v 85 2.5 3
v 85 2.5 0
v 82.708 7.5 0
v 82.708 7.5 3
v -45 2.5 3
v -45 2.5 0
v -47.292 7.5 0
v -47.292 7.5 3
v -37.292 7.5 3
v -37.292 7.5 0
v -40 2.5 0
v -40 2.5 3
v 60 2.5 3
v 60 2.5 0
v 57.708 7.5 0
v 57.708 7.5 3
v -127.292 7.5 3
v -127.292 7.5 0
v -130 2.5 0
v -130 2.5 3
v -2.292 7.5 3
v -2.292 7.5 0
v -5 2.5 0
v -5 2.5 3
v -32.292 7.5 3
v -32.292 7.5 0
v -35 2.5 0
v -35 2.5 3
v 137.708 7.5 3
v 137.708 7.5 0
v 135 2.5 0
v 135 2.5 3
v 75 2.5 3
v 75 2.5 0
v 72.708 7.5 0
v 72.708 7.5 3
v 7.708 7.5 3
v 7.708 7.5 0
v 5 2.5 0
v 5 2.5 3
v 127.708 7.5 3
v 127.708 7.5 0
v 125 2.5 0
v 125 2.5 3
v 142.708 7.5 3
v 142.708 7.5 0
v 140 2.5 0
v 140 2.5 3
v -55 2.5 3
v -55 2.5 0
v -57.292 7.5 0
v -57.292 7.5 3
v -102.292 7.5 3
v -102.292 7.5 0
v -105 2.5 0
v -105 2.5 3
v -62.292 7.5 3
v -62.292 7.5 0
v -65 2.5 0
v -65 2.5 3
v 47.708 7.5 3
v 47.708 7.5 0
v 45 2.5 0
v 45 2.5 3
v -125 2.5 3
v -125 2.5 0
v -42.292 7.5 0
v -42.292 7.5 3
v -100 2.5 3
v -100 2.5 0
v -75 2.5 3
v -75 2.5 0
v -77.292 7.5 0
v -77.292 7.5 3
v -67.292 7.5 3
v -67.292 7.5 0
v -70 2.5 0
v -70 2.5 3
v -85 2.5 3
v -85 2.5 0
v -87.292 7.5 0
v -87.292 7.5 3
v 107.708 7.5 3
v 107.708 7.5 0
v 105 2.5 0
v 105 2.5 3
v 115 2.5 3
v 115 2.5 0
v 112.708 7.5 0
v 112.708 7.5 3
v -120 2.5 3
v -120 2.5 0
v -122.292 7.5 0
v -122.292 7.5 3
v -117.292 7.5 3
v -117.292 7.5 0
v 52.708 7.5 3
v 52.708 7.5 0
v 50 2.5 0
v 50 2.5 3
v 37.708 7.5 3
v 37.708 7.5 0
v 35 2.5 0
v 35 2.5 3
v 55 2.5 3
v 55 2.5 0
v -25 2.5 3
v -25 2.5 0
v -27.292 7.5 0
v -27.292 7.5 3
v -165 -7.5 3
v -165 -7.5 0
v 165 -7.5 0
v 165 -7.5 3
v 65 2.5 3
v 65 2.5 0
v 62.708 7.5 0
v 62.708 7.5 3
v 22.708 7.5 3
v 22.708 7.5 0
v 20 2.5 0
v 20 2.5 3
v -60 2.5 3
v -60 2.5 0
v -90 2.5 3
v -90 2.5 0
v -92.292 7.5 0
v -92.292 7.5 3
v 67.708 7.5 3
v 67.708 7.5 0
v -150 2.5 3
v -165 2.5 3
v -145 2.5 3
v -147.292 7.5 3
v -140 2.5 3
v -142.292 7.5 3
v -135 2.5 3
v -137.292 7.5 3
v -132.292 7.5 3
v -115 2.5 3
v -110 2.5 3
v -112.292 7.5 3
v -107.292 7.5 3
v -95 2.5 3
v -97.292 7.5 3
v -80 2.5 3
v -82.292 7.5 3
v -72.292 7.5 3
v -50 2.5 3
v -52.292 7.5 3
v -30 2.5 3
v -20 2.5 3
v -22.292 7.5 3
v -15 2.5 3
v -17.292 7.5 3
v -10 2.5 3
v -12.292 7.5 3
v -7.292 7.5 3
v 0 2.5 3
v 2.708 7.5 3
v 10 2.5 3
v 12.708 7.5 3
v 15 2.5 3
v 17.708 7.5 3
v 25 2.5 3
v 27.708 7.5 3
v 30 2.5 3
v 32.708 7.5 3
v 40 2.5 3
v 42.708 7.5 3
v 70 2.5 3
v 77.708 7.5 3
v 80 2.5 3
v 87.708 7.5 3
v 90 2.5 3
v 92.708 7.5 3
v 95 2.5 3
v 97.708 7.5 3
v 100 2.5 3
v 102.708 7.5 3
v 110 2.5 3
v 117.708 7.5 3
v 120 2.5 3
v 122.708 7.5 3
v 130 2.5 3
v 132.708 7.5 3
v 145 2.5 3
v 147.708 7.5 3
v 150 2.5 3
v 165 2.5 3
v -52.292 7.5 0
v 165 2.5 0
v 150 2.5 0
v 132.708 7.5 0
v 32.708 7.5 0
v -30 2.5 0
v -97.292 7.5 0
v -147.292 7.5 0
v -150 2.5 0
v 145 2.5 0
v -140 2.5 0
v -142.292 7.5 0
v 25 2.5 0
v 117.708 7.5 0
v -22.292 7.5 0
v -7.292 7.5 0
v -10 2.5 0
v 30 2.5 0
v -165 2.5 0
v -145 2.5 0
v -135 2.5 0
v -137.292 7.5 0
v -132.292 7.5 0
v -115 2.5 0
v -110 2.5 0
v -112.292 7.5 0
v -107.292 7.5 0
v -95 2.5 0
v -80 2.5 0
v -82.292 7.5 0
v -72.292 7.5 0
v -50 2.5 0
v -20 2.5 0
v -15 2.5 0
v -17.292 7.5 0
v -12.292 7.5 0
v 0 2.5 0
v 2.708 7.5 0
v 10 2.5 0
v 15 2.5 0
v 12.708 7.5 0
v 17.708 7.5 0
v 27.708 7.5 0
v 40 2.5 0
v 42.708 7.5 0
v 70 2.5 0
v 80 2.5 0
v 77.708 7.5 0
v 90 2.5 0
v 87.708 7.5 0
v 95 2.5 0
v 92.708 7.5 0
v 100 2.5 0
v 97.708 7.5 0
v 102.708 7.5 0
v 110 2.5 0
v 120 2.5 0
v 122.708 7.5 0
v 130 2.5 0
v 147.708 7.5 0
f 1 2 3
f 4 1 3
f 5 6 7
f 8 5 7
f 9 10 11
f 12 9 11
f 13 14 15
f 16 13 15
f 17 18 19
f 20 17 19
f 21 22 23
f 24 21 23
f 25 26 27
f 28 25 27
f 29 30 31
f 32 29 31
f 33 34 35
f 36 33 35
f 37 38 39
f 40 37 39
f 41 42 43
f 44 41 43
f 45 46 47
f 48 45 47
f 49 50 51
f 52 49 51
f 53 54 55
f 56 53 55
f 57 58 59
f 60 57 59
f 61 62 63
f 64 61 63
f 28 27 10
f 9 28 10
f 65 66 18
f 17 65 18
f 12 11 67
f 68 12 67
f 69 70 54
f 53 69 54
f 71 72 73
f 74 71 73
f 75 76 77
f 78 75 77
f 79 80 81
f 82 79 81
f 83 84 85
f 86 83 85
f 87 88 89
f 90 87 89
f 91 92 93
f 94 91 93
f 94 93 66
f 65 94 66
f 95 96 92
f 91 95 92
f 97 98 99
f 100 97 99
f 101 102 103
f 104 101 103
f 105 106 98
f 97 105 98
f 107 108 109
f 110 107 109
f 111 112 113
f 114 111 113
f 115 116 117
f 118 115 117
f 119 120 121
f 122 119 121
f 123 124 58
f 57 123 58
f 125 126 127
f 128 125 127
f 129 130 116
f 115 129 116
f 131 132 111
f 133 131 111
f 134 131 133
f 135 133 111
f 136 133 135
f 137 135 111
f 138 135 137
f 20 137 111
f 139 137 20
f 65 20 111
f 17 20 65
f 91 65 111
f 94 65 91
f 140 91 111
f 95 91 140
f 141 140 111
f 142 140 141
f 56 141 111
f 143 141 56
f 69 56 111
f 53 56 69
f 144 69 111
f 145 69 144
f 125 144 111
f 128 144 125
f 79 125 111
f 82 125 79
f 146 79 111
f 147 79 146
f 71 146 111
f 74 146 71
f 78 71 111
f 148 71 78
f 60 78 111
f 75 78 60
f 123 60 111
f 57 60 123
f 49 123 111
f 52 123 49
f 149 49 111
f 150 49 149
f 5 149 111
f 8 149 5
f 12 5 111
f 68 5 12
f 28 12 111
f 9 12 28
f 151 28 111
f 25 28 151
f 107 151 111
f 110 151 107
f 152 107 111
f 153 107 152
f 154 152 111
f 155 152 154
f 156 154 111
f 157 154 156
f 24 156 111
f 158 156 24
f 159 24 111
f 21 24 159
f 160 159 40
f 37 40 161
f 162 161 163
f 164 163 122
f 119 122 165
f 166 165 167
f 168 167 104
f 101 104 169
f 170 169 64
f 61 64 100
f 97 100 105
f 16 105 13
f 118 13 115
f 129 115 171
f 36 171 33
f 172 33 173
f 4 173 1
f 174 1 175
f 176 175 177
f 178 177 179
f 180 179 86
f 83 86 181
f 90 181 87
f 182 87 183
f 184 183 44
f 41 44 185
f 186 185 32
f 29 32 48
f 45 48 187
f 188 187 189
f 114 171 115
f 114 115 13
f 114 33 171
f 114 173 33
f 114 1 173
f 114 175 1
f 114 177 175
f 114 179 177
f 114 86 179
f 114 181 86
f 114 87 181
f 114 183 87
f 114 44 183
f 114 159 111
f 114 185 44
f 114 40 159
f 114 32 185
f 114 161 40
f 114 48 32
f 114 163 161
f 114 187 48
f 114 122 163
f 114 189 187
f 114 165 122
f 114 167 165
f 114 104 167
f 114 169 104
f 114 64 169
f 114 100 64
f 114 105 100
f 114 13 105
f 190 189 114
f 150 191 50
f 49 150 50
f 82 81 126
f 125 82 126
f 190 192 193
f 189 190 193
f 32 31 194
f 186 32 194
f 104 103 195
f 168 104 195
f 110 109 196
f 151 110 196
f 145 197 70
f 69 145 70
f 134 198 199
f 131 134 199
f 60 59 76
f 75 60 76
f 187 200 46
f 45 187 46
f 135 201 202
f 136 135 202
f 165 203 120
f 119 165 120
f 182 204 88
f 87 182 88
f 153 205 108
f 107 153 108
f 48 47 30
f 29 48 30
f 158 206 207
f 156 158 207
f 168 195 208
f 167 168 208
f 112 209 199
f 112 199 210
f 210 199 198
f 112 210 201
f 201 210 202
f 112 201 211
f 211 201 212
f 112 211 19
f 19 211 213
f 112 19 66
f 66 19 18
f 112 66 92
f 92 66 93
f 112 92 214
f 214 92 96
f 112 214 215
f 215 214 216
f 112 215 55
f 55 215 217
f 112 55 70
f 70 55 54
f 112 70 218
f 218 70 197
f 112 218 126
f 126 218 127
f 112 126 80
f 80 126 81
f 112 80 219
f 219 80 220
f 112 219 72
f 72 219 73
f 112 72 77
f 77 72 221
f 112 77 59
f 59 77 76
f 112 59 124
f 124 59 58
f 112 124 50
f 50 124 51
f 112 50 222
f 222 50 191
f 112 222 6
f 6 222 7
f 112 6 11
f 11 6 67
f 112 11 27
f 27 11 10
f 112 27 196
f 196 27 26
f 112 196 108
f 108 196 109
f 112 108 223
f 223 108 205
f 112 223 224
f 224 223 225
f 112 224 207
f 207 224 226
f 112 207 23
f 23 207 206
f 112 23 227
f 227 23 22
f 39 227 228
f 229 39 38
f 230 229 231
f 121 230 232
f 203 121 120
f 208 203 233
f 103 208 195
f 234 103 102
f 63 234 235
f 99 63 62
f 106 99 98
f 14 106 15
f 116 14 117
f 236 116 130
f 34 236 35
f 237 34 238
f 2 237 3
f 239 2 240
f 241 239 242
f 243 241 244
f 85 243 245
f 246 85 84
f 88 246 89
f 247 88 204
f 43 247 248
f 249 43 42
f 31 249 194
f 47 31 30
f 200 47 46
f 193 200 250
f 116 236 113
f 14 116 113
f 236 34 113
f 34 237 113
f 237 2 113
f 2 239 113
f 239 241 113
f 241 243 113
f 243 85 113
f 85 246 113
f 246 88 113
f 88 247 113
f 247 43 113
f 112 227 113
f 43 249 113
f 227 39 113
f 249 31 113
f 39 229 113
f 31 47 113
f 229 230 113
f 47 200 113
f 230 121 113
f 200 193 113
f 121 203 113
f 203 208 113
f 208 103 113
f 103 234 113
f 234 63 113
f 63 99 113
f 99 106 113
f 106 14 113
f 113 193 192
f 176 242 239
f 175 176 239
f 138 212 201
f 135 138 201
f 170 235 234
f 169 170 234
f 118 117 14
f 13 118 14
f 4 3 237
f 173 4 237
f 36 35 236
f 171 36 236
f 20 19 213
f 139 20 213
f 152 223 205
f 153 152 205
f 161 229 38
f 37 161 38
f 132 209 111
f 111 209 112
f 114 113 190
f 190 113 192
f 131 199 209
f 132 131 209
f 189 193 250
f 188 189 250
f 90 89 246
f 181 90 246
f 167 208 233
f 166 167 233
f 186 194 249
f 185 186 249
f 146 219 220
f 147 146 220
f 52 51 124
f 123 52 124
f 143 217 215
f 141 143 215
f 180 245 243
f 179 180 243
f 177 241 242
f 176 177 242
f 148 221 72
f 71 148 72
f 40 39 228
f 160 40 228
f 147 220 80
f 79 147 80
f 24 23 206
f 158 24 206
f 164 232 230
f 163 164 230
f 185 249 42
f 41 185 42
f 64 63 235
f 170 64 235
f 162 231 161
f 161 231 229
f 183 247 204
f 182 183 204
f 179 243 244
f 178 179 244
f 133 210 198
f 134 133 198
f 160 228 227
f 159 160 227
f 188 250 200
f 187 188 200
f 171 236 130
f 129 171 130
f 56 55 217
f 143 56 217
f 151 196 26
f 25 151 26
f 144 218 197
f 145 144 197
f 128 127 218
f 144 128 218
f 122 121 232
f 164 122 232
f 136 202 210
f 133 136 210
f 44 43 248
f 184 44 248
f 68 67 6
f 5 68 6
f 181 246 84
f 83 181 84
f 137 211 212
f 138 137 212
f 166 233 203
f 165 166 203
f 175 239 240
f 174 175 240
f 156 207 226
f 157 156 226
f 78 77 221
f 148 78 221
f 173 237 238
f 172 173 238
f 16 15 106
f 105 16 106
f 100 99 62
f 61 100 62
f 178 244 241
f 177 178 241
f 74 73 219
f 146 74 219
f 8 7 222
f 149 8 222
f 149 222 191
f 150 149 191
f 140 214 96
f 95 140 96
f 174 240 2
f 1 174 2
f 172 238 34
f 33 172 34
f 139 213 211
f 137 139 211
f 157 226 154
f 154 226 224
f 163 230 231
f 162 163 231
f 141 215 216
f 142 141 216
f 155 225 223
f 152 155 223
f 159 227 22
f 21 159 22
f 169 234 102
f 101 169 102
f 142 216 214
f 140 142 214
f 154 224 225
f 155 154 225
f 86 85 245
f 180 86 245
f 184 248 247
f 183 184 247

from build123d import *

# Parameters (mm, degrees)
SALIENTE_EXTRUIR1_DEPTH = 3


with BuildPart() as part:
    # Croquis1 → Saliente-Extruir1 (new body)
    with BuildSketch(Plane.XY):
        Polygon((-150, 2.5), (-165, 2.5), (-165, -7.5), (-150, -7.5), (150, -7.5), (165, -7.5), (165, 2.5), (150, 2.5), (147.707897557, 7.5), (145, 2.5), (142.707897557, 7.5), (140, 2.5), (137.707897557, 7.5), (135, 2.5), (132.707897557, 7.5), (130, 2.5), (127.707897557, 7.5), (125, 2.5), (122.707897557, 7.5), (120, 2.5), (117.707897557, 7.5), (115, 2.5), (112.707897557, 7.5), (110, 2.5), (107.707897557, 7.5), (105, 2.5), (102.707897557, 7.5), (100, 2.5), (97.707897557, 7.5), (95, 2.5), (92.707897557, 7.5), (90, 2.5), (87.707897557, 7.5), (85, 2.5), (82.707897557, 7.5), (80, 2.5), (77.707897557, 7.5), (75, 2.5), (72.707897557, 7.5), (70, 2.5), (67.707897557, 7.5), (65, 2.5), (62.707897557, 7.5), (60, 2.5), (57.707897557, 7.5), (55, 2.5), (52.707897557, 7.5), (50, 2.5), (47.707897557, 7.5), (45, 2.5), (42.707897557, 7.5), (40, 2.5), (37.707897557, 7.5), (35, 2.5), (32.707897557, 7.5), (30, 2.5), (27.707897557, 7.5), (25, 2.5), (22.707897557, 7.5), (20, 2.5), (17.707897557, 7.5), (15, 2.5), (12.707897557, 7.5), (10, 2.5), (7.707897557, 7.5), (5, 2.5), (2.707897557, 7.5), (0, 2.5), (-2.292102443, 7.5), (-5, 2.5), (-7.292102443, 7.5), (-10, 2.5), (-12.292102443, 7.5), (-15, 2.5), (-17.292102443, 7.5), (-20, 2.5), (-22.292102443, 7.5), (-25, 2.5), (-27.292102443, 7.5), (-30, 2.5), (-32.292102443, 7.5), (-35, 2.5), (-37.292102443, 7.5), (-40, 2.5), (-42.292102443, 7.5), (-45, 2.5), (-47.292102443, 7.5), (-50, 2.5), (-52.292102443, 7.5), (-55, 2.5), (-57.292102443, 7.5), (-60, 2.5), (-62.292102443, 7.5), (-65, 2.5), (-67.292102443, 7.5), (-70, 2.5), (-72.292102443, 7.5), (-75, 2.5), (-77.292102443, 7.5), (-80, 2.5), (-82.292102443, 7.5), (-85, 2.5), (-87.292102443, 7.5), (-90, 2.5), (-92.292102443, 7.5), (-95, 2.5), (-97.292102443, 7.5), (-100, 2.5), (-102.292102443, 7.5), (-105, 2.5), (-107.292102443, 7.5), (-110, 2.5), (-112.292102443, 7.5), (-115, 2.5), (-117.292102443, 7.5), (-120, 2.5), (-122.292102443, 7.5), (-125, 2.5), (-127.292102443, 7.5), (-130, 2.5), (-132.292102443, 7.5), (-135, 2.5), (-137.292102443, 7.5), (-140, 2.5), (-142.292102443, 7.5), (-145, 2.5), (-147.292102443, 7.5), align=None)
    extrude(amount=SALIENTE_EXTRUIR1_DEPTH)


solid = part.part
